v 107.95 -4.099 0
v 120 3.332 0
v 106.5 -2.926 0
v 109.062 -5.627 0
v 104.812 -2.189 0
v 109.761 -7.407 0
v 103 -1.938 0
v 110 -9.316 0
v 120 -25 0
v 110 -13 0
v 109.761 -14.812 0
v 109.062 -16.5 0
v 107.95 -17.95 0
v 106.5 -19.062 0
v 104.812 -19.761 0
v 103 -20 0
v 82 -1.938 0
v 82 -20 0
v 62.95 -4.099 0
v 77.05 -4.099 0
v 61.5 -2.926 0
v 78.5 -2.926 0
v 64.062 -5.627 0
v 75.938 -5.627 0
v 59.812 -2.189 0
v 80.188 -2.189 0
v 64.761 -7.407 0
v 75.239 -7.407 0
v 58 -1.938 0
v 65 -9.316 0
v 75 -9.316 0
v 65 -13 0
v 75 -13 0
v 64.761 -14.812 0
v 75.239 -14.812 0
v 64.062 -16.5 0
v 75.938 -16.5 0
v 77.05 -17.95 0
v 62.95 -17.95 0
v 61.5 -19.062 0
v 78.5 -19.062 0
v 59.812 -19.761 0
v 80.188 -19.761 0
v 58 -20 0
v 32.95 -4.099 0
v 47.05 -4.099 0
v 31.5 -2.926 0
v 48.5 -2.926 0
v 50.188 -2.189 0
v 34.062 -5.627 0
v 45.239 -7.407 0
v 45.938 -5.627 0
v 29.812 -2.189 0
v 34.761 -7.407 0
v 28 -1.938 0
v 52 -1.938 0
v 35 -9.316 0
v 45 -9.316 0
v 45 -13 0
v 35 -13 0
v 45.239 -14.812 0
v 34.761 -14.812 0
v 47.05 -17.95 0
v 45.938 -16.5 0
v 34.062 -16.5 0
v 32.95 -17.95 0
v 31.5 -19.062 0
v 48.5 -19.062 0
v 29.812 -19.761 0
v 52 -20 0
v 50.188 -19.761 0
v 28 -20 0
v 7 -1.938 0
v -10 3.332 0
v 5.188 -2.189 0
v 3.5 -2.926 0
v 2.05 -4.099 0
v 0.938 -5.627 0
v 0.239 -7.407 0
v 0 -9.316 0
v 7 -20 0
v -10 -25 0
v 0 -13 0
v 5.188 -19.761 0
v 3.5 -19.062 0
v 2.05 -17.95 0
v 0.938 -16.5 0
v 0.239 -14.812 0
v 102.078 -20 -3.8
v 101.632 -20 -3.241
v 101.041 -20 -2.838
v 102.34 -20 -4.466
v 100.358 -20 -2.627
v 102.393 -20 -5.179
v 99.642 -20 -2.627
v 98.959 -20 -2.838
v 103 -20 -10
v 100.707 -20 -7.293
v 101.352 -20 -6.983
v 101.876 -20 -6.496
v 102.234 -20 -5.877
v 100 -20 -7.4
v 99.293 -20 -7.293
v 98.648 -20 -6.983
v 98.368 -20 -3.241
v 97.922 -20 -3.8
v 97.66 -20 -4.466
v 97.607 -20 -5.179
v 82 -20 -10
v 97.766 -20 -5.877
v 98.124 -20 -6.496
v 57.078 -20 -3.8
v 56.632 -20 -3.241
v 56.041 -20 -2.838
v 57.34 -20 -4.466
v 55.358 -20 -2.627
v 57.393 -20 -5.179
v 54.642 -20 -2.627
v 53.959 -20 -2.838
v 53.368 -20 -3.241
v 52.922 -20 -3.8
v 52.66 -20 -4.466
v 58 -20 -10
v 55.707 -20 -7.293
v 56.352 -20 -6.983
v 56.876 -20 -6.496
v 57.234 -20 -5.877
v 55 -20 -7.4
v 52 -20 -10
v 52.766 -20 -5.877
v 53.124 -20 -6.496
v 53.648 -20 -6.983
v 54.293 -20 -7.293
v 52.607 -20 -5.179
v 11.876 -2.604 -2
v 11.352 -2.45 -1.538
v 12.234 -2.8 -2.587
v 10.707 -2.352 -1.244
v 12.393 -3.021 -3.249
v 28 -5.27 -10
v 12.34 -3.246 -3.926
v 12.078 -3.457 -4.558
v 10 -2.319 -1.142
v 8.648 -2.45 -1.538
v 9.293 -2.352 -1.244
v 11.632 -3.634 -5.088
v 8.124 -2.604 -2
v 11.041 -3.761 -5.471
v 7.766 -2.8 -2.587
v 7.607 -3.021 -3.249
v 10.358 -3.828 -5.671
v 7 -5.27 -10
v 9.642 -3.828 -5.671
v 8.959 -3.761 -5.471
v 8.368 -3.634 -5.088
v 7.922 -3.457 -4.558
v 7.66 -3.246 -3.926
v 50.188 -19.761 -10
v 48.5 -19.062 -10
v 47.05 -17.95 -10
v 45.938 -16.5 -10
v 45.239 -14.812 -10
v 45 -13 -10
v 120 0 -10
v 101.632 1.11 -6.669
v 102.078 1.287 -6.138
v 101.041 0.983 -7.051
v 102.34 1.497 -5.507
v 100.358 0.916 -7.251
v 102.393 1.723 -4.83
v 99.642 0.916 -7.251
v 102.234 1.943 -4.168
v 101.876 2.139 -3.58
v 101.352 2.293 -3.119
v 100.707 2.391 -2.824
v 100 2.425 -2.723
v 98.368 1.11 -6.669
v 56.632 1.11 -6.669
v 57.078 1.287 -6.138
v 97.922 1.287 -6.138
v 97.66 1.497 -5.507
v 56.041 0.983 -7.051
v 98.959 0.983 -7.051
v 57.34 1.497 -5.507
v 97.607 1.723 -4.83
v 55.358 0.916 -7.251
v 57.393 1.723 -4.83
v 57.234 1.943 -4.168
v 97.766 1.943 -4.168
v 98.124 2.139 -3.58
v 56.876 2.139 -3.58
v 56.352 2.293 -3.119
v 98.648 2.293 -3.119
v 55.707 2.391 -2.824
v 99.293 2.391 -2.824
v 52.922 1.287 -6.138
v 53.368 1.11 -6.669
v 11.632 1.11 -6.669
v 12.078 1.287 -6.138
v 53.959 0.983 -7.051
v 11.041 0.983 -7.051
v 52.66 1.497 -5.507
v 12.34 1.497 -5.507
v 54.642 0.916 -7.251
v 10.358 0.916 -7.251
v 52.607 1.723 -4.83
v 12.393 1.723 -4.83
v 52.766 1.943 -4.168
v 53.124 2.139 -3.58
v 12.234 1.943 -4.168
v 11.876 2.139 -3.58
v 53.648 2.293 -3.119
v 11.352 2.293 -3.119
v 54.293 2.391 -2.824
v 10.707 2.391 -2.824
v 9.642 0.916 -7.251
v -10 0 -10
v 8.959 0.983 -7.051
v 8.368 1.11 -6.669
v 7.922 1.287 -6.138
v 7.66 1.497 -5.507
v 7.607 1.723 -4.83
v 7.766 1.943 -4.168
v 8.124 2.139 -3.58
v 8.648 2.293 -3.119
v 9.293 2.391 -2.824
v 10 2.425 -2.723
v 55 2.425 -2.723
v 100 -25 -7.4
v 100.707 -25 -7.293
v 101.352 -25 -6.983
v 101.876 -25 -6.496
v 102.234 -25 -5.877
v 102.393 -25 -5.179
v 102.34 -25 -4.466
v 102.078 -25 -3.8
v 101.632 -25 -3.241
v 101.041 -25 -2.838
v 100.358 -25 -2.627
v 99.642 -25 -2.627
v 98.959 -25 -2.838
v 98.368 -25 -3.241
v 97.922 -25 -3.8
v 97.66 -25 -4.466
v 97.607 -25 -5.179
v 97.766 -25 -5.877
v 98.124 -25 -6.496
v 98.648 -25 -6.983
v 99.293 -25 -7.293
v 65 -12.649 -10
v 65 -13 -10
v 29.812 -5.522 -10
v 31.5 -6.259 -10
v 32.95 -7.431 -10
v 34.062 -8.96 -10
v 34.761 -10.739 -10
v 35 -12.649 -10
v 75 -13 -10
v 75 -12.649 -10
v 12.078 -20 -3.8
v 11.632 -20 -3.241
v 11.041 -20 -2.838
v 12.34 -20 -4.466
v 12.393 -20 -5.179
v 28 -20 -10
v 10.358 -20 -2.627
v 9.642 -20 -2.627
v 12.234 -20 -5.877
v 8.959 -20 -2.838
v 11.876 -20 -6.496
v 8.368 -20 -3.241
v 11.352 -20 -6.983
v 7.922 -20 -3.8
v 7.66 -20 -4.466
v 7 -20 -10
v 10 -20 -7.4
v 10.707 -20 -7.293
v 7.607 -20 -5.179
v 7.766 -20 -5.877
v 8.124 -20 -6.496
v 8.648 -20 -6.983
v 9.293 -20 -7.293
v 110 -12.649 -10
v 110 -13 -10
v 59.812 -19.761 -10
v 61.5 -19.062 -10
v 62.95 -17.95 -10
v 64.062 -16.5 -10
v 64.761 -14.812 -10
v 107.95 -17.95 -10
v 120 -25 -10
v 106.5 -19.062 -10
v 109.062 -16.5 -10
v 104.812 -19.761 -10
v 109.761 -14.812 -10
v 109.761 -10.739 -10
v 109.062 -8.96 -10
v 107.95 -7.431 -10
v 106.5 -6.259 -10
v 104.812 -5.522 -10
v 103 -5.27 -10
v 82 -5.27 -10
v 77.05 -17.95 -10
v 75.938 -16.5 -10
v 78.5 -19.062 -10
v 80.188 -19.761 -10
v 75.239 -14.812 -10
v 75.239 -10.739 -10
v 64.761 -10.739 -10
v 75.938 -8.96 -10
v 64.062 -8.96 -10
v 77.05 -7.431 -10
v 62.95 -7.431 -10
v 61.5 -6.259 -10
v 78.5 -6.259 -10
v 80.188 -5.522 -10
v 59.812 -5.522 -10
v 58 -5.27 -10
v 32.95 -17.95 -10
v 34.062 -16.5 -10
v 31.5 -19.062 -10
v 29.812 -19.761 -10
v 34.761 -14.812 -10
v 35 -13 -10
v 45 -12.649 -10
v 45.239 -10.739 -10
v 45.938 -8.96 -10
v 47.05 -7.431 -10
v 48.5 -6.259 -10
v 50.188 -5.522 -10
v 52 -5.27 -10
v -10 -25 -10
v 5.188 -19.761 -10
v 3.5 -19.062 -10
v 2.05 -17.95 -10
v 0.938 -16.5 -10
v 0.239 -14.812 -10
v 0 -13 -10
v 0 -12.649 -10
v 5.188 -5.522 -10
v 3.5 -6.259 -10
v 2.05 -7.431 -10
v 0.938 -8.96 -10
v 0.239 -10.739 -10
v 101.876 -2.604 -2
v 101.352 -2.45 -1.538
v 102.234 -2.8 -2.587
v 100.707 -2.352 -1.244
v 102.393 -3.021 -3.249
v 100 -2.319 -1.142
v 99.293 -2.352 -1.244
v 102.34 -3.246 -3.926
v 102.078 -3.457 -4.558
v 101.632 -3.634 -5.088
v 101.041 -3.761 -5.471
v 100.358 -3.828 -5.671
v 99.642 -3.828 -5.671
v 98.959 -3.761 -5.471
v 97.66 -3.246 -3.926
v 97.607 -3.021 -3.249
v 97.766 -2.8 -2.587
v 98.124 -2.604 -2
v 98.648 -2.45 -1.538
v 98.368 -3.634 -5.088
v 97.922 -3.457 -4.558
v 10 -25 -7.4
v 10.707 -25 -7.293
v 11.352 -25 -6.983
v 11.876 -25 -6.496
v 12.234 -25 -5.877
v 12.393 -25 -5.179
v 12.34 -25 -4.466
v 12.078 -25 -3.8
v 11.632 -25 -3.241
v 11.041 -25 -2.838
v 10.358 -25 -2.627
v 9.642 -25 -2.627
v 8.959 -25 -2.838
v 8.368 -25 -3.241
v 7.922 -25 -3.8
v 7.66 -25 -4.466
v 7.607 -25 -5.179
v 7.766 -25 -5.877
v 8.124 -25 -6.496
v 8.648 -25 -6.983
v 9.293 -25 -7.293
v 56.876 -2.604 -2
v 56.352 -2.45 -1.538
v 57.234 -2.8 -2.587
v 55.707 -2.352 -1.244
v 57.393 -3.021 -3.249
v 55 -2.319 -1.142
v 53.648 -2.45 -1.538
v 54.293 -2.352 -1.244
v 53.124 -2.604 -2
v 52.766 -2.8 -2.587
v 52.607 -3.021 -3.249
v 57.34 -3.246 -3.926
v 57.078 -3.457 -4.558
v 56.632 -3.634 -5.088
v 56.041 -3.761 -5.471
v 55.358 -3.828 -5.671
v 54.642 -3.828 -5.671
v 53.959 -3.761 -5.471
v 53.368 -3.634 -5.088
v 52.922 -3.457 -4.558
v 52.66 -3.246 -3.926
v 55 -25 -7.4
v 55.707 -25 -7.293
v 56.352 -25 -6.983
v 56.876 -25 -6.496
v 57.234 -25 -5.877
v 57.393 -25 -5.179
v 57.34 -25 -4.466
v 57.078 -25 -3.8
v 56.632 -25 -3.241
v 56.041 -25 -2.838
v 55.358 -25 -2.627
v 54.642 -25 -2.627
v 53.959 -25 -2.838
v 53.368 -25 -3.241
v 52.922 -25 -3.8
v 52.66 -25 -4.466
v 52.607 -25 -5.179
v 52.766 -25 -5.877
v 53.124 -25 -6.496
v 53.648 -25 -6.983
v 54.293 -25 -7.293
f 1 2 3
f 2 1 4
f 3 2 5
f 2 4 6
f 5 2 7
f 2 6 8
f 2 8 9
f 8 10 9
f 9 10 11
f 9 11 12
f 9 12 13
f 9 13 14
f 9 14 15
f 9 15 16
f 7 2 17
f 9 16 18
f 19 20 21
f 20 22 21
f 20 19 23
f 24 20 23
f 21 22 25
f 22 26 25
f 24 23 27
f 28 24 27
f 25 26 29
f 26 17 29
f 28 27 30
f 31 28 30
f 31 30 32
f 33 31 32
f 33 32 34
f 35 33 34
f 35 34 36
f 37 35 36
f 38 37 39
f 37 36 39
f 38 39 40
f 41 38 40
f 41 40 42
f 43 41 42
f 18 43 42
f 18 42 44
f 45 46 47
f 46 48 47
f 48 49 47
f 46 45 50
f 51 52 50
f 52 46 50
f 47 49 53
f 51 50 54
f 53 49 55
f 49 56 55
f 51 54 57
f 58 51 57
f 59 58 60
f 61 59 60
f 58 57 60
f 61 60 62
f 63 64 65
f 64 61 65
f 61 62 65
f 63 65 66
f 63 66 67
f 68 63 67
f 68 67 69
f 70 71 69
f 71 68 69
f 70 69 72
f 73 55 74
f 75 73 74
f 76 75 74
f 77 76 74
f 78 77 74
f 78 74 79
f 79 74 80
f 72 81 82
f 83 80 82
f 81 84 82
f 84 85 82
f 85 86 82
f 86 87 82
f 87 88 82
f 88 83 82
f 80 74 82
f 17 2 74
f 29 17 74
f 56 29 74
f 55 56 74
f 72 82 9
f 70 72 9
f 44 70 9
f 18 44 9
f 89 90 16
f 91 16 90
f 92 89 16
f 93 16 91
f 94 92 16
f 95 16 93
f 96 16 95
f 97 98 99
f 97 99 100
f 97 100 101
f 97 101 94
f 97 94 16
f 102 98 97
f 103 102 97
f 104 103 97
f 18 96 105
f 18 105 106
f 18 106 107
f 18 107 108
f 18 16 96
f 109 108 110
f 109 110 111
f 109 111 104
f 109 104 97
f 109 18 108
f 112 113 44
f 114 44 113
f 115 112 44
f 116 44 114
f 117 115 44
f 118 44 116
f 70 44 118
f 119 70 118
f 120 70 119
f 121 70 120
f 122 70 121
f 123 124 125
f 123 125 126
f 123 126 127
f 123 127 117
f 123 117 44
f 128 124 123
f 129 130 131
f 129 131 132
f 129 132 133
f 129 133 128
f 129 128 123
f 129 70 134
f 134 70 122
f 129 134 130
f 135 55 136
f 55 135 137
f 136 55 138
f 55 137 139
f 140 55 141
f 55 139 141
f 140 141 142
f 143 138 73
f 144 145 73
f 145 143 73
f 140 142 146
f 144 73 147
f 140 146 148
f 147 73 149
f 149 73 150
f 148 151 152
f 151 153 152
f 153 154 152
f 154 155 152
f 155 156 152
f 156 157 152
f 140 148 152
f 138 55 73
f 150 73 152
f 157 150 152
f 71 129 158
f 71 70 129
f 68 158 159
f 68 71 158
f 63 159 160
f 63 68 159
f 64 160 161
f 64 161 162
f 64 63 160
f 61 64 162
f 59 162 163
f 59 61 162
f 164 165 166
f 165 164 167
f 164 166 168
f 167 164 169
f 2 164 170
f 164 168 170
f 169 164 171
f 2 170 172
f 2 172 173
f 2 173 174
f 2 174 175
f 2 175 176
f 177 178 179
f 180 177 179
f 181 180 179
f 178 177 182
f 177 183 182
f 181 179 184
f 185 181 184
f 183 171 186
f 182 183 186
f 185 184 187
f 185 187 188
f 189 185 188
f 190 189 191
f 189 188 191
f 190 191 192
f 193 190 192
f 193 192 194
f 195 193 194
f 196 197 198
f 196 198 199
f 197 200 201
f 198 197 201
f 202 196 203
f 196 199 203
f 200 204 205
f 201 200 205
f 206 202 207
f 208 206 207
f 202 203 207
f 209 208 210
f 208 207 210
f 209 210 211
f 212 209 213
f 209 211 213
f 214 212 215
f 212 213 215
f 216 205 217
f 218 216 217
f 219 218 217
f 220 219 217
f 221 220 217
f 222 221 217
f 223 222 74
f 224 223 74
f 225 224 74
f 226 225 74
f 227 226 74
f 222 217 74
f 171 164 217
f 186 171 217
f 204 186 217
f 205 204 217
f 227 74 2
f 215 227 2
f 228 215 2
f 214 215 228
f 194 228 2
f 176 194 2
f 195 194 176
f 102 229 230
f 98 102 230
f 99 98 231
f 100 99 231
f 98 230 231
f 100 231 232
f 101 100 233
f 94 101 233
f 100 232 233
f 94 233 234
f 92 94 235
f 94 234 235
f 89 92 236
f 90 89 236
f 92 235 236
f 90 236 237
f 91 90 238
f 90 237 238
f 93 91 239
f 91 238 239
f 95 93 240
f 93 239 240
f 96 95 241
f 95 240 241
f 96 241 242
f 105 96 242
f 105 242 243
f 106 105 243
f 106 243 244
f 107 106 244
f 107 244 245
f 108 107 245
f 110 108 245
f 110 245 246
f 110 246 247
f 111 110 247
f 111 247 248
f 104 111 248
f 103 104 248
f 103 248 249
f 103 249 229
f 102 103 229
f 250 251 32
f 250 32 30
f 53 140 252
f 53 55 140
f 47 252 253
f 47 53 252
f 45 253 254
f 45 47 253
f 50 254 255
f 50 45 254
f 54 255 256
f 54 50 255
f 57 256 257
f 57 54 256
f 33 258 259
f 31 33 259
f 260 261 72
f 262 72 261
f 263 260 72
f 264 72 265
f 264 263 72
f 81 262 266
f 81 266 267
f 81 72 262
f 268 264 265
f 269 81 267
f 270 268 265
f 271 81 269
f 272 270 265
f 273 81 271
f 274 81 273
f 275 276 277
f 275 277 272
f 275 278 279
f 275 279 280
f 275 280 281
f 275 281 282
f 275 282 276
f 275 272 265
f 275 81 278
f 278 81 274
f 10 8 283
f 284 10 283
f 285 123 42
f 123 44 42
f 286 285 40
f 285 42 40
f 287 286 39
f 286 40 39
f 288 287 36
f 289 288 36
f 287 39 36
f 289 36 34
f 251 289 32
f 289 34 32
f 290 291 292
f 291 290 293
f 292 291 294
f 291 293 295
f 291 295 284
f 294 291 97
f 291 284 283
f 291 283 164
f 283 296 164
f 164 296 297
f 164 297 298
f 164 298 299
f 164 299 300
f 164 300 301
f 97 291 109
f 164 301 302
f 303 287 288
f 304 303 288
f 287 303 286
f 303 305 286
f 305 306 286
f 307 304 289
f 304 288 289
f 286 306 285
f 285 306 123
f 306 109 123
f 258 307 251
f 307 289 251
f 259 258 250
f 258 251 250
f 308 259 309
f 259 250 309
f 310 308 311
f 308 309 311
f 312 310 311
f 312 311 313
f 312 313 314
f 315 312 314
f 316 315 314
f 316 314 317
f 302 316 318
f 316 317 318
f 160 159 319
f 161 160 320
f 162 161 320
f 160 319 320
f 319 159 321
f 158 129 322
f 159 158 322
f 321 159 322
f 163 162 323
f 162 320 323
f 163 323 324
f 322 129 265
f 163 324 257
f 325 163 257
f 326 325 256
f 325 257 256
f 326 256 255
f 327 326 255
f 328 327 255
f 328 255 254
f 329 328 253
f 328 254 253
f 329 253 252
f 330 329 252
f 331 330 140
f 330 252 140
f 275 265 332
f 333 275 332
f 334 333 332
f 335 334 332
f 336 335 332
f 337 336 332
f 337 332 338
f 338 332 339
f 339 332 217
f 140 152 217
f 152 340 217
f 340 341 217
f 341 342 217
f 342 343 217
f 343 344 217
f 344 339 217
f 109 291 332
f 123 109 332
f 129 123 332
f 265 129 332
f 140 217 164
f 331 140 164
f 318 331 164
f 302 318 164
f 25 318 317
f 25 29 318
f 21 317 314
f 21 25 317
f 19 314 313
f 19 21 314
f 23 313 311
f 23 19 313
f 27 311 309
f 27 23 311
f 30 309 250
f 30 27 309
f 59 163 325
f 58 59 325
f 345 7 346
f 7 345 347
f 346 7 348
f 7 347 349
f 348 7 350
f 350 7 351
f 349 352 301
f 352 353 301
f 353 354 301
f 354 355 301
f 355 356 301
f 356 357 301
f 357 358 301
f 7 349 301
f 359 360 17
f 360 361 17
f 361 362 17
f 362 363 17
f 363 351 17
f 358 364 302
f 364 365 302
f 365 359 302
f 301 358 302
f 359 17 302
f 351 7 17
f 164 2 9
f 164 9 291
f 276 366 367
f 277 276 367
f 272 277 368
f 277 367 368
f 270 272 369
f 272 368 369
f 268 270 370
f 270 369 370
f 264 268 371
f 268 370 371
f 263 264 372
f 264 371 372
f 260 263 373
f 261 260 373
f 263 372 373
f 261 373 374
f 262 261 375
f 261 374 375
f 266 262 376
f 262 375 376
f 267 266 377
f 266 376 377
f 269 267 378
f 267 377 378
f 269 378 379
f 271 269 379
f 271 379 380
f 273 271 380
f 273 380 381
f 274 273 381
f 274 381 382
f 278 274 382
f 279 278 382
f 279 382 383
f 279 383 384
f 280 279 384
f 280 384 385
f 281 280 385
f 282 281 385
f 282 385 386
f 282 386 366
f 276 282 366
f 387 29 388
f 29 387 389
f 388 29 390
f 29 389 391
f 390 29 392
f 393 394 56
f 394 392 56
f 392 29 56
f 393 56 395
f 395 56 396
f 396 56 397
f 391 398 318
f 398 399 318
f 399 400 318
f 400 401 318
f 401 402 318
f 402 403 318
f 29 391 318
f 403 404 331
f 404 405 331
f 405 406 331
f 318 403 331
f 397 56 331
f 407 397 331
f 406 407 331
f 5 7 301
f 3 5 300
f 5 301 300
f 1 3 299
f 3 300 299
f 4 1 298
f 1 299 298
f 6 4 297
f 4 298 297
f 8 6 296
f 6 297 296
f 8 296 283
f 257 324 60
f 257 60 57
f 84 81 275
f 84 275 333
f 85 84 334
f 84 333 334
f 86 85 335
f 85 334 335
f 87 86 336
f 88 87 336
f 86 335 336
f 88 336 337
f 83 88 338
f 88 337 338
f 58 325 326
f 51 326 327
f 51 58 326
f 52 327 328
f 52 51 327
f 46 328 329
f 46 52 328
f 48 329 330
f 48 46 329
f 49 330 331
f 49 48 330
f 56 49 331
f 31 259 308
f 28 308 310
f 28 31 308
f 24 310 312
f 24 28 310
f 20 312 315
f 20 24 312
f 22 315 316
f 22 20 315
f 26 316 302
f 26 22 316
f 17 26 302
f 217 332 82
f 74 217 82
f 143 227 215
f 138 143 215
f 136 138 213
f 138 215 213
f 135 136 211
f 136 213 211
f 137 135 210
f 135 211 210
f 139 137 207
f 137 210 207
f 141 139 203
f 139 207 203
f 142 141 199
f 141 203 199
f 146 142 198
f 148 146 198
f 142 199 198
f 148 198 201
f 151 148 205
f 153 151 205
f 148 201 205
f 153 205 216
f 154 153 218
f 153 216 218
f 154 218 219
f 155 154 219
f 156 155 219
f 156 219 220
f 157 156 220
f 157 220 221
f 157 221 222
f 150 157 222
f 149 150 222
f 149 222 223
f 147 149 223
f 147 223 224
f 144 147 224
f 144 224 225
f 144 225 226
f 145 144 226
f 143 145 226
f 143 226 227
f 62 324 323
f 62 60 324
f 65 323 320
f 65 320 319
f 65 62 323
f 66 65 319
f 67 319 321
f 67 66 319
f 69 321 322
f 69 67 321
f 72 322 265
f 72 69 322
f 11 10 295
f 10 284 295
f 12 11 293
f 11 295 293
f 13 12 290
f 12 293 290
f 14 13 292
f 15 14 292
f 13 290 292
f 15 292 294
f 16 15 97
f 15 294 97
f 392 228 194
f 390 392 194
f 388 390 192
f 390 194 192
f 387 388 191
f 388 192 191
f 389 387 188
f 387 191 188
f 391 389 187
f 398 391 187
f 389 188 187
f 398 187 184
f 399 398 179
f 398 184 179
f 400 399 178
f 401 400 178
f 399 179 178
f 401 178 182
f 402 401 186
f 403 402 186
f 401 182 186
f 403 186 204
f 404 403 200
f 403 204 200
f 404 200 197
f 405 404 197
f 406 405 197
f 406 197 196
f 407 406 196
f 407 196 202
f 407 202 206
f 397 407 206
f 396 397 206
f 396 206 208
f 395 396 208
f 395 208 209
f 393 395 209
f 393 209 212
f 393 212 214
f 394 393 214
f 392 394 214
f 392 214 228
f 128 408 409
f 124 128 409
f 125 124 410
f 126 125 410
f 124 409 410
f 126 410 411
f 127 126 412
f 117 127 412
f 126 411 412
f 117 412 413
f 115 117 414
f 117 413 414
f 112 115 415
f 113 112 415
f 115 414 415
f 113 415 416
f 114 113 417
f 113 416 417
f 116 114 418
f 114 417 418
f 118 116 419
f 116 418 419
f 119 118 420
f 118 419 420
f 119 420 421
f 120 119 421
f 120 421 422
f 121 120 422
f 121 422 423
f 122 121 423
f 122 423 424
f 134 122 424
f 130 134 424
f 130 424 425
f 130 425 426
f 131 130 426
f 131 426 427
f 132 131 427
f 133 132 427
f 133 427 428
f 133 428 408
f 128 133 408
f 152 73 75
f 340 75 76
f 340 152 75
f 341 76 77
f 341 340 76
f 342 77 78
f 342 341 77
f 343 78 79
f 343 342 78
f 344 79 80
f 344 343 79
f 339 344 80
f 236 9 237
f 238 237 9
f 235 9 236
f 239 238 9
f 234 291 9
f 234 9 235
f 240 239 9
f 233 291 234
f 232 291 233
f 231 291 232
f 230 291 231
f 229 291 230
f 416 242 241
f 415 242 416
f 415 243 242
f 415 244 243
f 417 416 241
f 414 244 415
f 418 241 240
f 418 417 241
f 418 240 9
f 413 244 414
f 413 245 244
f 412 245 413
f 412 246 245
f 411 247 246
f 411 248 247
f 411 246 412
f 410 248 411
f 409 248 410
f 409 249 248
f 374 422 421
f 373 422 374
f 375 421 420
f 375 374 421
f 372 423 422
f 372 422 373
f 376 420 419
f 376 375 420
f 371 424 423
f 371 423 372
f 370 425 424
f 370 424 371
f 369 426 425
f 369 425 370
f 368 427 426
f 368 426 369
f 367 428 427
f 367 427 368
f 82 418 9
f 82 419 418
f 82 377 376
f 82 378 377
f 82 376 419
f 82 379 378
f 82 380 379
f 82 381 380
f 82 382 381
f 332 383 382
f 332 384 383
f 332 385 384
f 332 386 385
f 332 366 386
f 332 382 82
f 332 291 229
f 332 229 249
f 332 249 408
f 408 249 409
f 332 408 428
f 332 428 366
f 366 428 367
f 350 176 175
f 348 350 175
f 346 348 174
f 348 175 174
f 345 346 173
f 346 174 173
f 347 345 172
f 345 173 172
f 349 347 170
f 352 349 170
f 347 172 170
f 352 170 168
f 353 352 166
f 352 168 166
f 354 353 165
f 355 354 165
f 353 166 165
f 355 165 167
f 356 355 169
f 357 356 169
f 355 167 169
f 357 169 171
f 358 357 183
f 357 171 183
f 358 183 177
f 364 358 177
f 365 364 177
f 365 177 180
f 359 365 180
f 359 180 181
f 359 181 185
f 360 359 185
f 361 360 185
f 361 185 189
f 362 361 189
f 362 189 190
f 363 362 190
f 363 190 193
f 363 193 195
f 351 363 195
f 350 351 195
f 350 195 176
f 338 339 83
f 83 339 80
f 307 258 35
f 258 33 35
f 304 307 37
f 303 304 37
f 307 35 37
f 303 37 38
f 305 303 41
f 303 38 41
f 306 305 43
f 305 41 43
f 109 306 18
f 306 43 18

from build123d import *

# Parameters (mm, degrees)
ESQUISSE1_W             = 10
ESQUISSE1_H             = 5
BOSS_EXTRU_1_DEPTH      = 110
BOSS_EXTRU_2_DEPTH      = 10
BOSS_EXTRU_3_DEPTH      = 10
ESQUISSE4_W             = 10
ESQUISSE4_H             = 25
BOSS_EXTRU_4_DEPTH      = 10
ESQUISSE5_R             = 2.4
ENL_V_MAT_EXTRU_1_DEPTH = 10
ESQUISSE6_R             = 2.4
ENL_V_MAT_EXTRU_2_DEPTH = 10
CONG_1_R                = 7


with BuildPart() as part:
    # Esquisse1 → Boss.-Extru.1 (new body)
    with BuildSketch(Plane(origin=(0, 0, 0), x_dir=(0, 0, -1), z_dir=(1, 0, 0))):
        Polygon((10, 0), (0, 3.332373658), (0, 0), align=None)
        Polygon((0, 0), (0, -1.93793739), (10, -5.270311049), (10, 0), align=None)
        with Locations((5, -22.5)):
            Rectangle(ESQUISSE1_W, ESQUISSE1_H)
    extrude(amount=BOSS_EXTRU_1_DEPTH)

    # Esquisse2 → Boss.-Extru.2 (add)
    with BuildSketch(Plane.ZY):
        Polygon((0, 3.332373658), (-10, 0), (0, 0), align=None)
        Polygon((0, 0), (-10, 0), (-10, -5.270311049), (0, -1.93793739), align=None)
        Polygon((0, -1.93793739), (-10, -5.270311049), (-10, -25), (0, -25), align=None)
    extrude(amount=BOSS_EXTRU_2_DEPTH)

    # Esquisse3 → Boss.-Extru.3 (add)
    with BuildSketch(Plane(origin=(110, 0, 0), x_dir=(0, 0, -1), z_dir=(1, 0, 0))):
        Polygon((0, 0), (10, 0), (0, 3.332373658), align=None)
        Polygon((10, -5.270311049), (10, 0), (0, 0), (0, -1.93793739), align=None)
        Polygon((10, -25), (10, -5.270311049), (0, -1.93793739), (0, -25), align=None)
    extrude(amount=BOSS_EXTRU_3_DEPTH)

    # Esquisse4 → Boss.-Extru.4 (add)
    with BuildSketch(Plane(origin=(0, 0, -10), x_dir=(-1, 0, 0), z_dir=(0, 0, -1))):
        with Locations((-70, -12.5)):
            Rectangle(ESQUISSE4_W, ESQUISSE4_H)
        with Locations((-40, -12.5)):
            Rectangle(ESQUISSE4_W, ESQUISSE4_H)
    extrude(amount=-BOSS_EXTRU_4_DEPTH)

    # Esquisse5 → Enlèv. mat.-Extru.1 (cut)
    with BuildSketch(Plane(origin=(0, 2.999308969, -0.99948182), x_dir=(1, 0, 0), z_dir=(0, 0.948710608132916, -0.3161458239737997))):
        with Locations(Location((10, 4.216795033, 0), (0, 0, 270))):
            Circle(ESQUISSE5_R)
        with Locations(Location((55, 4.216795033, 0), (0, 0, 270))):
            Circle(ESQUISSE5_R)
        with Locations(Location((100, 4.216795033, 0), (0, 0, 270))):
            Circle(ESQUISSE5_R)
    extrude(amount=-ENL_V_MAT_EXTRU_1_DEPTH, mode=Mode.SUBTRACT)

    # Esquisse6 → Enlèv. mat.-Extru.2 (cut)
    with BuildSketch(Plane.XZ.offset(25)):
        with Locations(Location((10, -5, 0), (0, 0, 270))):
            Circle(ESQUISSE6_R)
        with Locations(Location((55, -5, 0), (0, 0, 270))):
            Circle(ESQUISSE6_R)
        with Locations(Location((100, -5, 0), (0, 0, 270))):
            Circle(ESQUISSE6_R)
    extrude(amount=-ENL_V_MAT_EXTRU_2_DEPTH, mode=Mode.SUBTRACT)

    # Congé1
    cong_1_edges = [part.edges().sort_by_distance(p)[0] for p in [
        (75, -20, -5),
        (65, -20, -5),
        (75, -3.60412422, -5),
        (65, -3.60412422, -5),
        (110, -3.60412422, -5),
        (110, -20, -5),
        (0, -20, -5),
        (0, -3.60412422, -5),
        (35, -20, -5),
        (45, -20, -5),
        (45, -3.60412422, -5),
        (35, -3.60412422, -5),
    ]]
    fillet(cong_1_edges, radius=CONG_1_R)


solid = part.part
